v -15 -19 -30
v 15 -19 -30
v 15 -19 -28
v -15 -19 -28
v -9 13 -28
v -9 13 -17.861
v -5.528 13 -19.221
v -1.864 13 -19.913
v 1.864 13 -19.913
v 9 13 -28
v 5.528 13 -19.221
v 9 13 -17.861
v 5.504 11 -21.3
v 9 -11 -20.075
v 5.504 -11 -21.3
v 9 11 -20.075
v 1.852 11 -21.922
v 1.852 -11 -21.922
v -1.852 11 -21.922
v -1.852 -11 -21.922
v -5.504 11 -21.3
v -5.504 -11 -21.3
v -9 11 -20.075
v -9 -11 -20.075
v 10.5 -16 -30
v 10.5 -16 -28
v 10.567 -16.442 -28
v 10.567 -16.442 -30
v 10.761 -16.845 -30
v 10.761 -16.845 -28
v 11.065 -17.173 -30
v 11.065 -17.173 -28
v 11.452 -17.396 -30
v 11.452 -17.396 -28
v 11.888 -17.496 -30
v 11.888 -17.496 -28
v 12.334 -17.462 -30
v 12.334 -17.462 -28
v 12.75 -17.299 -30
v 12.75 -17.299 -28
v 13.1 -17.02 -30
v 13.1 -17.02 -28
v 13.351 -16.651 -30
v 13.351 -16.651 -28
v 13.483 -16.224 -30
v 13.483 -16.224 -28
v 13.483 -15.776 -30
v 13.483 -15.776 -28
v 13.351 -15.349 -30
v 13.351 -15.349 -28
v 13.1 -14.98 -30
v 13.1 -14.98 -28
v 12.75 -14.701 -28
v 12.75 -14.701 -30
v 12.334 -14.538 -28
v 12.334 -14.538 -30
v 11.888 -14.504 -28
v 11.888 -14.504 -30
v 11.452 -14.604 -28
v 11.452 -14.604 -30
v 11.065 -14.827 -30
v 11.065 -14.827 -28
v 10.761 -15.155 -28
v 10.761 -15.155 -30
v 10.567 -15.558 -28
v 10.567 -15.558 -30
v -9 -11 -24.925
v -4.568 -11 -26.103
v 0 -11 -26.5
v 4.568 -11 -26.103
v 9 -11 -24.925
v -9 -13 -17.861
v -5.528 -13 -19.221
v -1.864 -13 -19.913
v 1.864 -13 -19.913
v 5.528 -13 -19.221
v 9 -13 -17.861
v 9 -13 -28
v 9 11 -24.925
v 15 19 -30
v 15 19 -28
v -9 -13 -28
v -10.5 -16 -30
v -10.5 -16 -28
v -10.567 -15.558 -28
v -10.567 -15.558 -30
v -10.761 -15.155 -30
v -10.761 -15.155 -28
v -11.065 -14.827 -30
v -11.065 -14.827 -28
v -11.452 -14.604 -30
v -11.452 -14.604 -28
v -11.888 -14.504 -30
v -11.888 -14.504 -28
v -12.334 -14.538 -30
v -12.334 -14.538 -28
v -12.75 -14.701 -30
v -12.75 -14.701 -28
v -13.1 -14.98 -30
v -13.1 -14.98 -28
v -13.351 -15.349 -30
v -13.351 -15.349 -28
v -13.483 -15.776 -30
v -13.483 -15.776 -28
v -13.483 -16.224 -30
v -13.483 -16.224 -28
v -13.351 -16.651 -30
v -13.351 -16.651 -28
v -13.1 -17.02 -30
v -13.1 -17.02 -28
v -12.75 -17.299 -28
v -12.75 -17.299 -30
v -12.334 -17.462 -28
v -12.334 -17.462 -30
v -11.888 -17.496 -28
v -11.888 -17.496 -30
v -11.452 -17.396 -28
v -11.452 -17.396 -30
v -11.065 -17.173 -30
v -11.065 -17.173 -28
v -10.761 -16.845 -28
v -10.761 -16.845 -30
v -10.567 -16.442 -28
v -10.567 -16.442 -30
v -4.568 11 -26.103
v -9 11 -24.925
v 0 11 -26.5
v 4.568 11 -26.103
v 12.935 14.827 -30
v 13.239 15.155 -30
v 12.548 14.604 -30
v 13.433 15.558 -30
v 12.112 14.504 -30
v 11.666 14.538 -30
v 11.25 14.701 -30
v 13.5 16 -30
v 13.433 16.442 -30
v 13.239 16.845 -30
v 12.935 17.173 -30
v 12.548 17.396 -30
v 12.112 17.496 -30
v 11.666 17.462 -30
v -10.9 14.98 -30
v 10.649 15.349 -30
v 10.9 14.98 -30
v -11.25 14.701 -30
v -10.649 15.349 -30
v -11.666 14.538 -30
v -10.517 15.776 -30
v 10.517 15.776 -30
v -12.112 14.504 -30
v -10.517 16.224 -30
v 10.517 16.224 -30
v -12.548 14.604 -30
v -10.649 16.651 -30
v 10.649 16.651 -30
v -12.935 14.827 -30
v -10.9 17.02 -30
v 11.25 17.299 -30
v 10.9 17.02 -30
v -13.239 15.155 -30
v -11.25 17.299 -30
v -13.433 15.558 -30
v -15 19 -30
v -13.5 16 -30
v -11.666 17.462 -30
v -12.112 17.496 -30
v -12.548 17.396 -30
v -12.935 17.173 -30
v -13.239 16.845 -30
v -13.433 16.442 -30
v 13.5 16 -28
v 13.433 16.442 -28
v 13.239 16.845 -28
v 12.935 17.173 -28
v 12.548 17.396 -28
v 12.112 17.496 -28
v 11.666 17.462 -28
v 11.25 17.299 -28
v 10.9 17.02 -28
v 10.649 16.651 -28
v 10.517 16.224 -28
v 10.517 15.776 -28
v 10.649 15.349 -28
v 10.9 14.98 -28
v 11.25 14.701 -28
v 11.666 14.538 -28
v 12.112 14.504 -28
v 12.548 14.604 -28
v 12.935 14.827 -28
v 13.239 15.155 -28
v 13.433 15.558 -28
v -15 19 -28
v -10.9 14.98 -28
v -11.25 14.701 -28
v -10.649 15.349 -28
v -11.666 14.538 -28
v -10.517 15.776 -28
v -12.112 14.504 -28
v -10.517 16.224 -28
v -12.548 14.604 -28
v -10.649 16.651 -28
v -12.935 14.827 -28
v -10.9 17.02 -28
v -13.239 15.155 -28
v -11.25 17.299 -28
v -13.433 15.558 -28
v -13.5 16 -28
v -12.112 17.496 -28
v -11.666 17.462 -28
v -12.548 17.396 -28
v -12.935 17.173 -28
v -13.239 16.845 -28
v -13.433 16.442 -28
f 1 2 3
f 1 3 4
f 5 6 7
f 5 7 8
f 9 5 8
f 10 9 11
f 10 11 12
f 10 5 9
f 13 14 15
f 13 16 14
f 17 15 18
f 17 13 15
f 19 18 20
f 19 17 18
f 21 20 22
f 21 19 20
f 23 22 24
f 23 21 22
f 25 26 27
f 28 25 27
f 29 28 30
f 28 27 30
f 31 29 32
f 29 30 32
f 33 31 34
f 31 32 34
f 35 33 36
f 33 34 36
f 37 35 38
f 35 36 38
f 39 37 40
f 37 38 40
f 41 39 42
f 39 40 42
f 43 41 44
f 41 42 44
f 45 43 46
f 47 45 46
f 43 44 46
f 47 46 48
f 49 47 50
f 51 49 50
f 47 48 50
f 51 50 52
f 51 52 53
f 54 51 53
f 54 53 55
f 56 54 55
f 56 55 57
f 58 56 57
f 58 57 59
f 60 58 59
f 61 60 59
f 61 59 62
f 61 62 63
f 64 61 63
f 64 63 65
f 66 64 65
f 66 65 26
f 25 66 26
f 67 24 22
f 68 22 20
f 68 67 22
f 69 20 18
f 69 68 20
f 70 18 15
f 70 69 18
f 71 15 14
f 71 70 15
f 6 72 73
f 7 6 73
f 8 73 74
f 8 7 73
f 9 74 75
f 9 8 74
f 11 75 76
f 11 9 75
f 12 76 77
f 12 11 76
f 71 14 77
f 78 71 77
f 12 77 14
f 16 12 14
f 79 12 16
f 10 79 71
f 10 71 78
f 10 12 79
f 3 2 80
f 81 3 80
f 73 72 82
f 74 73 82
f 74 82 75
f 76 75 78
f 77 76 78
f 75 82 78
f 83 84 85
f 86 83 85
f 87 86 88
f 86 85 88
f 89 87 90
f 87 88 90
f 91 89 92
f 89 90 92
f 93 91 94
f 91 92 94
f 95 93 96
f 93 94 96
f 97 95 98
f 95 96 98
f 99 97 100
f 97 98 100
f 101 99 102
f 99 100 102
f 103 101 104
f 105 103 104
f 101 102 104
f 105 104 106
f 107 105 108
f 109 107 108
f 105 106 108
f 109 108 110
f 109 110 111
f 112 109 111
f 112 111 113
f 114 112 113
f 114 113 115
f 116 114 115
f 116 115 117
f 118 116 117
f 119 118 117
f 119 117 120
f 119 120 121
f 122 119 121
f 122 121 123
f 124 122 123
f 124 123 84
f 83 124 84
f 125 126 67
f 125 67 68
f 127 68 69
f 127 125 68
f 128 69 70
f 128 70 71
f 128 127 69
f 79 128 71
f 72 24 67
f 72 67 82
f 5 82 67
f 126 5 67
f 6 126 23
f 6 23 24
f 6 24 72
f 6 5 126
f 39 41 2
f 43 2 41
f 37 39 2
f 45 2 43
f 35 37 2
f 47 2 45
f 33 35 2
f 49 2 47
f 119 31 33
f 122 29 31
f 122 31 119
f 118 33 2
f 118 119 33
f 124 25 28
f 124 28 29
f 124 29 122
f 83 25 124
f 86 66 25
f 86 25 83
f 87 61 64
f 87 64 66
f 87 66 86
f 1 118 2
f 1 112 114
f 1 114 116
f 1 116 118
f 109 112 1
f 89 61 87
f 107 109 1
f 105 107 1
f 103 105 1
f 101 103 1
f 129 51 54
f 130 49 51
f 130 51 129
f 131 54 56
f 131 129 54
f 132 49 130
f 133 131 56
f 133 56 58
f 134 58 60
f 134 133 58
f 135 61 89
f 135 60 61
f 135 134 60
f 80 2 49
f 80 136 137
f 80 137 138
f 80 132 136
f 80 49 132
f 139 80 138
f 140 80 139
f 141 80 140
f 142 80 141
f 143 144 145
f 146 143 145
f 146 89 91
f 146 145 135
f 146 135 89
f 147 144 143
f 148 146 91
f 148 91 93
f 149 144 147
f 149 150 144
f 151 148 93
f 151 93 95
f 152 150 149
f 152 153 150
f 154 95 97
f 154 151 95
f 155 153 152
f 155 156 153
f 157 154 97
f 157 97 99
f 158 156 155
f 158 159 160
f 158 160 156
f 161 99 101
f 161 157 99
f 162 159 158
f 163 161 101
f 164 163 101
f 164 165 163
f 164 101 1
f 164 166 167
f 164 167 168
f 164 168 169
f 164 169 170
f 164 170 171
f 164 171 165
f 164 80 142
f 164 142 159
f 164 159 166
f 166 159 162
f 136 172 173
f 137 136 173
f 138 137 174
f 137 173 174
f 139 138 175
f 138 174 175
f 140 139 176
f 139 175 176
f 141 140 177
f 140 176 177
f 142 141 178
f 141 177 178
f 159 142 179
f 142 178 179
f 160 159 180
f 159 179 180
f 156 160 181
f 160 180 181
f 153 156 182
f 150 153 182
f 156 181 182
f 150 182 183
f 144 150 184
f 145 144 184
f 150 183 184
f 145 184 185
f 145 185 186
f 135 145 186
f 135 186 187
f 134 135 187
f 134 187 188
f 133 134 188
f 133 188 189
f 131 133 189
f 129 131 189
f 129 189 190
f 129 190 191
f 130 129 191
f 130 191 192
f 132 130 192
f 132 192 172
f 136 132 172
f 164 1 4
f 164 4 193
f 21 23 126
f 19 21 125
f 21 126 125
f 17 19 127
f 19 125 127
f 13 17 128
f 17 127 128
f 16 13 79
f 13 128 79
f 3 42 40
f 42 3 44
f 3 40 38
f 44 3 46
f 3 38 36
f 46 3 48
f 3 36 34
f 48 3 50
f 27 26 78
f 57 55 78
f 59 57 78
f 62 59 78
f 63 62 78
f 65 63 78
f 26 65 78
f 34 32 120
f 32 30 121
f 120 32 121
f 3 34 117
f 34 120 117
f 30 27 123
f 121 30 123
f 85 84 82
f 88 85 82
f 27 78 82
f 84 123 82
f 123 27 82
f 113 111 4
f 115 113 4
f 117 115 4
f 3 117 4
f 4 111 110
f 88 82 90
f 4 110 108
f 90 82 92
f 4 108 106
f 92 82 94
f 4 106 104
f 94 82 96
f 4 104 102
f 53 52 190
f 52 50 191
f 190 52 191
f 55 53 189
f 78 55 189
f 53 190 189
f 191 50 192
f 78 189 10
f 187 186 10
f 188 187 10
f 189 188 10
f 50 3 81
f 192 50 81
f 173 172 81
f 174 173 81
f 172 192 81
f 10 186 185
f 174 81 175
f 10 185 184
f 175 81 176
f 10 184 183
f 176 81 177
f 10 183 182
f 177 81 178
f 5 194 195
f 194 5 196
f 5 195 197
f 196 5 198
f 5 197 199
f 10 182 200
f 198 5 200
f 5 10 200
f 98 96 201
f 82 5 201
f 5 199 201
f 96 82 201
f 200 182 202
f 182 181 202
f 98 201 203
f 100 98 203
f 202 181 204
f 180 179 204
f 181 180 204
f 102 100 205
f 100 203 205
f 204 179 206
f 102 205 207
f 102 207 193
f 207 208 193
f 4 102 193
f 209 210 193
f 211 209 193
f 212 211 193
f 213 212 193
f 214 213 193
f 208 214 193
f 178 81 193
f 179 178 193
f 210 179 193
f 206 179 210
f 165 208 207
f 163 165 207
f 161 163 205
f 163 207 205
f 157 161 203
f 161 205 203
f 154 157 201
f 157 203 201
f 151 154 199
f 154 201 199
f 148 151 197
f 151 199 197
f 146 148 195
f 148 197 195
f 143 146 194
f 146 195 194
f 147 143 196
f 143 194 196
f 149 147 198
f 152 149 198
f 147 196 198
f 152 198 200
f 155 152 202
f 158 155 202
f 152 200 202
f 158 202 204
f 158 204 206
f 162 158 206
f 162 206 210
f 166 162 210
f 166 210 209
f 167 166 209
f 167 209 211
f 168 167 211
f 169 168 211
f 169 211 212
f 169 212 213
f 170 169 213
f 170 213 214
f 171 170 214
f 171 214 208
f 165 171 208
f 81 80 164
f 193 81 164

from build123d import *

# Parameters (mm, degrees)
EXTRUDE_1_DEPTH     = 11
EXTRUDE_1_2_DEPTH   = 11
EXTRUDE_2_DEPTH     = 2
SKETCH_5_W          = 30
SKETCH_5_H          = 38
SKETCH_5_W_2        = 18
SKETCH_5_H_2        = 26
EXTRUDE_3_DEPTH     = 2
SKETCH_6_R          = 1.5
CUT_EXTRUDE_1_DEPTH = 27.245152284


with BuildPart() as part:
    # 草图1 → 凸台-拉伸1 (new, symmetric)
    with BuildSketch(Plane(origin=(0, 0, 0), x_dir=(1, 0, 0), z_dir=(0, 1, 0))):
        with BuildLine():
            Line((-9, 30), (-9, 24.924887161))
            ThreePointArc((-9, 24.924887161), (0, 26.5), (9, 24.924887161))
            Line((9, 24.924887161), (9, 30))
            Line((9, 30), (-9, 30))
        make_face()
    extrude(amount=EXTRUDE_1_DEPTH, both=True)



with BuildPart() as body_2:
    # 草图1 → Extrude 1 2 (new, symmetric)
    with BuildSketch(Plane(origin=(0, 0, 0), x_dir=(1, 0, 0), z_dir=(0, 1, 0))):
        with BuildLine():
            Line((-9, 20.0748599), (-9, 17.860571099))
            ThreePointArc((-9, 17.860571099), (0, 20), (9, 17.860571099))
            Line((9, 17.860571099), (9, 20.0748599))
            ThreePointArc((9, 20.0748599), (0, 22), (-9, 20.0748599))
        make_face()
    extrude(amount=EXTRUDE_1_2_DEPTH, both=True)


with BuildPart() as part_1:
    add(part.part)

    add(body_2.part)  # 凸台-拉伸2 merges body 2
    # 草图2 → 凸台-拉伸2 (add)
    with BuildSketch(Plane(origin=(0, 11, 0), x_dir=(1, 0, 0), z_dir=(0, 1, 0))):
        with BuildLine():
            Line((-9, 30), (-9, 17.860571099))
            ThreePointArc((-9, 17.860571099), (0, 20), (9, 17.860571099))
            Line((9, 17.860571099), (9, 30))
            Line((9, 30), (-9, 30))
        make_face()
    extrude_2 = extrude(amount=EXTRUDE_2_DEPTH)

    # 镜向1: 凸台-拉伸2 across plane
    add(extrude_2.mirror(Plane.ZX))

    # 草图5 → 凸台-拉伸3 (add)
    with BuildSketch(Plane(origin=(0, 0, -30), x_dir=(-1, 0, 0), z_dir=(0, 0, -1))):
        Rectangle(SKETCH_5_W, SKETCH_5_H)
        Rectangle(SKETCH_5_W_2, SKETCH_5_H_2, mode=Mode.SUBTRACT)
    extrude(amount=-EXTRUDE_3_DEPTH)

    # 草图6 → 切除-拉伸1 (cut, through all)
    with BuildSketch(Plane.XY.offset(-28)):
        with Locations((12, 16)):
            Circle(SKETCH_6_R)
        with Locations(Location((-12, 16, 0), (0, 0, 180))):
            Circle(SKETCH_6_R)
        with Locations(Location((12, -16, 0), (0, 0, 180))):
            Circle(SKETCH_6_R)
        with Locations((-12, -16)):
            Circle(SKETCH_6_R)
    extrude(amount=-CUT_EXTRUDE_1_DEPTH, mode=Mode.SUBTRACT)


solid = part_1.part
